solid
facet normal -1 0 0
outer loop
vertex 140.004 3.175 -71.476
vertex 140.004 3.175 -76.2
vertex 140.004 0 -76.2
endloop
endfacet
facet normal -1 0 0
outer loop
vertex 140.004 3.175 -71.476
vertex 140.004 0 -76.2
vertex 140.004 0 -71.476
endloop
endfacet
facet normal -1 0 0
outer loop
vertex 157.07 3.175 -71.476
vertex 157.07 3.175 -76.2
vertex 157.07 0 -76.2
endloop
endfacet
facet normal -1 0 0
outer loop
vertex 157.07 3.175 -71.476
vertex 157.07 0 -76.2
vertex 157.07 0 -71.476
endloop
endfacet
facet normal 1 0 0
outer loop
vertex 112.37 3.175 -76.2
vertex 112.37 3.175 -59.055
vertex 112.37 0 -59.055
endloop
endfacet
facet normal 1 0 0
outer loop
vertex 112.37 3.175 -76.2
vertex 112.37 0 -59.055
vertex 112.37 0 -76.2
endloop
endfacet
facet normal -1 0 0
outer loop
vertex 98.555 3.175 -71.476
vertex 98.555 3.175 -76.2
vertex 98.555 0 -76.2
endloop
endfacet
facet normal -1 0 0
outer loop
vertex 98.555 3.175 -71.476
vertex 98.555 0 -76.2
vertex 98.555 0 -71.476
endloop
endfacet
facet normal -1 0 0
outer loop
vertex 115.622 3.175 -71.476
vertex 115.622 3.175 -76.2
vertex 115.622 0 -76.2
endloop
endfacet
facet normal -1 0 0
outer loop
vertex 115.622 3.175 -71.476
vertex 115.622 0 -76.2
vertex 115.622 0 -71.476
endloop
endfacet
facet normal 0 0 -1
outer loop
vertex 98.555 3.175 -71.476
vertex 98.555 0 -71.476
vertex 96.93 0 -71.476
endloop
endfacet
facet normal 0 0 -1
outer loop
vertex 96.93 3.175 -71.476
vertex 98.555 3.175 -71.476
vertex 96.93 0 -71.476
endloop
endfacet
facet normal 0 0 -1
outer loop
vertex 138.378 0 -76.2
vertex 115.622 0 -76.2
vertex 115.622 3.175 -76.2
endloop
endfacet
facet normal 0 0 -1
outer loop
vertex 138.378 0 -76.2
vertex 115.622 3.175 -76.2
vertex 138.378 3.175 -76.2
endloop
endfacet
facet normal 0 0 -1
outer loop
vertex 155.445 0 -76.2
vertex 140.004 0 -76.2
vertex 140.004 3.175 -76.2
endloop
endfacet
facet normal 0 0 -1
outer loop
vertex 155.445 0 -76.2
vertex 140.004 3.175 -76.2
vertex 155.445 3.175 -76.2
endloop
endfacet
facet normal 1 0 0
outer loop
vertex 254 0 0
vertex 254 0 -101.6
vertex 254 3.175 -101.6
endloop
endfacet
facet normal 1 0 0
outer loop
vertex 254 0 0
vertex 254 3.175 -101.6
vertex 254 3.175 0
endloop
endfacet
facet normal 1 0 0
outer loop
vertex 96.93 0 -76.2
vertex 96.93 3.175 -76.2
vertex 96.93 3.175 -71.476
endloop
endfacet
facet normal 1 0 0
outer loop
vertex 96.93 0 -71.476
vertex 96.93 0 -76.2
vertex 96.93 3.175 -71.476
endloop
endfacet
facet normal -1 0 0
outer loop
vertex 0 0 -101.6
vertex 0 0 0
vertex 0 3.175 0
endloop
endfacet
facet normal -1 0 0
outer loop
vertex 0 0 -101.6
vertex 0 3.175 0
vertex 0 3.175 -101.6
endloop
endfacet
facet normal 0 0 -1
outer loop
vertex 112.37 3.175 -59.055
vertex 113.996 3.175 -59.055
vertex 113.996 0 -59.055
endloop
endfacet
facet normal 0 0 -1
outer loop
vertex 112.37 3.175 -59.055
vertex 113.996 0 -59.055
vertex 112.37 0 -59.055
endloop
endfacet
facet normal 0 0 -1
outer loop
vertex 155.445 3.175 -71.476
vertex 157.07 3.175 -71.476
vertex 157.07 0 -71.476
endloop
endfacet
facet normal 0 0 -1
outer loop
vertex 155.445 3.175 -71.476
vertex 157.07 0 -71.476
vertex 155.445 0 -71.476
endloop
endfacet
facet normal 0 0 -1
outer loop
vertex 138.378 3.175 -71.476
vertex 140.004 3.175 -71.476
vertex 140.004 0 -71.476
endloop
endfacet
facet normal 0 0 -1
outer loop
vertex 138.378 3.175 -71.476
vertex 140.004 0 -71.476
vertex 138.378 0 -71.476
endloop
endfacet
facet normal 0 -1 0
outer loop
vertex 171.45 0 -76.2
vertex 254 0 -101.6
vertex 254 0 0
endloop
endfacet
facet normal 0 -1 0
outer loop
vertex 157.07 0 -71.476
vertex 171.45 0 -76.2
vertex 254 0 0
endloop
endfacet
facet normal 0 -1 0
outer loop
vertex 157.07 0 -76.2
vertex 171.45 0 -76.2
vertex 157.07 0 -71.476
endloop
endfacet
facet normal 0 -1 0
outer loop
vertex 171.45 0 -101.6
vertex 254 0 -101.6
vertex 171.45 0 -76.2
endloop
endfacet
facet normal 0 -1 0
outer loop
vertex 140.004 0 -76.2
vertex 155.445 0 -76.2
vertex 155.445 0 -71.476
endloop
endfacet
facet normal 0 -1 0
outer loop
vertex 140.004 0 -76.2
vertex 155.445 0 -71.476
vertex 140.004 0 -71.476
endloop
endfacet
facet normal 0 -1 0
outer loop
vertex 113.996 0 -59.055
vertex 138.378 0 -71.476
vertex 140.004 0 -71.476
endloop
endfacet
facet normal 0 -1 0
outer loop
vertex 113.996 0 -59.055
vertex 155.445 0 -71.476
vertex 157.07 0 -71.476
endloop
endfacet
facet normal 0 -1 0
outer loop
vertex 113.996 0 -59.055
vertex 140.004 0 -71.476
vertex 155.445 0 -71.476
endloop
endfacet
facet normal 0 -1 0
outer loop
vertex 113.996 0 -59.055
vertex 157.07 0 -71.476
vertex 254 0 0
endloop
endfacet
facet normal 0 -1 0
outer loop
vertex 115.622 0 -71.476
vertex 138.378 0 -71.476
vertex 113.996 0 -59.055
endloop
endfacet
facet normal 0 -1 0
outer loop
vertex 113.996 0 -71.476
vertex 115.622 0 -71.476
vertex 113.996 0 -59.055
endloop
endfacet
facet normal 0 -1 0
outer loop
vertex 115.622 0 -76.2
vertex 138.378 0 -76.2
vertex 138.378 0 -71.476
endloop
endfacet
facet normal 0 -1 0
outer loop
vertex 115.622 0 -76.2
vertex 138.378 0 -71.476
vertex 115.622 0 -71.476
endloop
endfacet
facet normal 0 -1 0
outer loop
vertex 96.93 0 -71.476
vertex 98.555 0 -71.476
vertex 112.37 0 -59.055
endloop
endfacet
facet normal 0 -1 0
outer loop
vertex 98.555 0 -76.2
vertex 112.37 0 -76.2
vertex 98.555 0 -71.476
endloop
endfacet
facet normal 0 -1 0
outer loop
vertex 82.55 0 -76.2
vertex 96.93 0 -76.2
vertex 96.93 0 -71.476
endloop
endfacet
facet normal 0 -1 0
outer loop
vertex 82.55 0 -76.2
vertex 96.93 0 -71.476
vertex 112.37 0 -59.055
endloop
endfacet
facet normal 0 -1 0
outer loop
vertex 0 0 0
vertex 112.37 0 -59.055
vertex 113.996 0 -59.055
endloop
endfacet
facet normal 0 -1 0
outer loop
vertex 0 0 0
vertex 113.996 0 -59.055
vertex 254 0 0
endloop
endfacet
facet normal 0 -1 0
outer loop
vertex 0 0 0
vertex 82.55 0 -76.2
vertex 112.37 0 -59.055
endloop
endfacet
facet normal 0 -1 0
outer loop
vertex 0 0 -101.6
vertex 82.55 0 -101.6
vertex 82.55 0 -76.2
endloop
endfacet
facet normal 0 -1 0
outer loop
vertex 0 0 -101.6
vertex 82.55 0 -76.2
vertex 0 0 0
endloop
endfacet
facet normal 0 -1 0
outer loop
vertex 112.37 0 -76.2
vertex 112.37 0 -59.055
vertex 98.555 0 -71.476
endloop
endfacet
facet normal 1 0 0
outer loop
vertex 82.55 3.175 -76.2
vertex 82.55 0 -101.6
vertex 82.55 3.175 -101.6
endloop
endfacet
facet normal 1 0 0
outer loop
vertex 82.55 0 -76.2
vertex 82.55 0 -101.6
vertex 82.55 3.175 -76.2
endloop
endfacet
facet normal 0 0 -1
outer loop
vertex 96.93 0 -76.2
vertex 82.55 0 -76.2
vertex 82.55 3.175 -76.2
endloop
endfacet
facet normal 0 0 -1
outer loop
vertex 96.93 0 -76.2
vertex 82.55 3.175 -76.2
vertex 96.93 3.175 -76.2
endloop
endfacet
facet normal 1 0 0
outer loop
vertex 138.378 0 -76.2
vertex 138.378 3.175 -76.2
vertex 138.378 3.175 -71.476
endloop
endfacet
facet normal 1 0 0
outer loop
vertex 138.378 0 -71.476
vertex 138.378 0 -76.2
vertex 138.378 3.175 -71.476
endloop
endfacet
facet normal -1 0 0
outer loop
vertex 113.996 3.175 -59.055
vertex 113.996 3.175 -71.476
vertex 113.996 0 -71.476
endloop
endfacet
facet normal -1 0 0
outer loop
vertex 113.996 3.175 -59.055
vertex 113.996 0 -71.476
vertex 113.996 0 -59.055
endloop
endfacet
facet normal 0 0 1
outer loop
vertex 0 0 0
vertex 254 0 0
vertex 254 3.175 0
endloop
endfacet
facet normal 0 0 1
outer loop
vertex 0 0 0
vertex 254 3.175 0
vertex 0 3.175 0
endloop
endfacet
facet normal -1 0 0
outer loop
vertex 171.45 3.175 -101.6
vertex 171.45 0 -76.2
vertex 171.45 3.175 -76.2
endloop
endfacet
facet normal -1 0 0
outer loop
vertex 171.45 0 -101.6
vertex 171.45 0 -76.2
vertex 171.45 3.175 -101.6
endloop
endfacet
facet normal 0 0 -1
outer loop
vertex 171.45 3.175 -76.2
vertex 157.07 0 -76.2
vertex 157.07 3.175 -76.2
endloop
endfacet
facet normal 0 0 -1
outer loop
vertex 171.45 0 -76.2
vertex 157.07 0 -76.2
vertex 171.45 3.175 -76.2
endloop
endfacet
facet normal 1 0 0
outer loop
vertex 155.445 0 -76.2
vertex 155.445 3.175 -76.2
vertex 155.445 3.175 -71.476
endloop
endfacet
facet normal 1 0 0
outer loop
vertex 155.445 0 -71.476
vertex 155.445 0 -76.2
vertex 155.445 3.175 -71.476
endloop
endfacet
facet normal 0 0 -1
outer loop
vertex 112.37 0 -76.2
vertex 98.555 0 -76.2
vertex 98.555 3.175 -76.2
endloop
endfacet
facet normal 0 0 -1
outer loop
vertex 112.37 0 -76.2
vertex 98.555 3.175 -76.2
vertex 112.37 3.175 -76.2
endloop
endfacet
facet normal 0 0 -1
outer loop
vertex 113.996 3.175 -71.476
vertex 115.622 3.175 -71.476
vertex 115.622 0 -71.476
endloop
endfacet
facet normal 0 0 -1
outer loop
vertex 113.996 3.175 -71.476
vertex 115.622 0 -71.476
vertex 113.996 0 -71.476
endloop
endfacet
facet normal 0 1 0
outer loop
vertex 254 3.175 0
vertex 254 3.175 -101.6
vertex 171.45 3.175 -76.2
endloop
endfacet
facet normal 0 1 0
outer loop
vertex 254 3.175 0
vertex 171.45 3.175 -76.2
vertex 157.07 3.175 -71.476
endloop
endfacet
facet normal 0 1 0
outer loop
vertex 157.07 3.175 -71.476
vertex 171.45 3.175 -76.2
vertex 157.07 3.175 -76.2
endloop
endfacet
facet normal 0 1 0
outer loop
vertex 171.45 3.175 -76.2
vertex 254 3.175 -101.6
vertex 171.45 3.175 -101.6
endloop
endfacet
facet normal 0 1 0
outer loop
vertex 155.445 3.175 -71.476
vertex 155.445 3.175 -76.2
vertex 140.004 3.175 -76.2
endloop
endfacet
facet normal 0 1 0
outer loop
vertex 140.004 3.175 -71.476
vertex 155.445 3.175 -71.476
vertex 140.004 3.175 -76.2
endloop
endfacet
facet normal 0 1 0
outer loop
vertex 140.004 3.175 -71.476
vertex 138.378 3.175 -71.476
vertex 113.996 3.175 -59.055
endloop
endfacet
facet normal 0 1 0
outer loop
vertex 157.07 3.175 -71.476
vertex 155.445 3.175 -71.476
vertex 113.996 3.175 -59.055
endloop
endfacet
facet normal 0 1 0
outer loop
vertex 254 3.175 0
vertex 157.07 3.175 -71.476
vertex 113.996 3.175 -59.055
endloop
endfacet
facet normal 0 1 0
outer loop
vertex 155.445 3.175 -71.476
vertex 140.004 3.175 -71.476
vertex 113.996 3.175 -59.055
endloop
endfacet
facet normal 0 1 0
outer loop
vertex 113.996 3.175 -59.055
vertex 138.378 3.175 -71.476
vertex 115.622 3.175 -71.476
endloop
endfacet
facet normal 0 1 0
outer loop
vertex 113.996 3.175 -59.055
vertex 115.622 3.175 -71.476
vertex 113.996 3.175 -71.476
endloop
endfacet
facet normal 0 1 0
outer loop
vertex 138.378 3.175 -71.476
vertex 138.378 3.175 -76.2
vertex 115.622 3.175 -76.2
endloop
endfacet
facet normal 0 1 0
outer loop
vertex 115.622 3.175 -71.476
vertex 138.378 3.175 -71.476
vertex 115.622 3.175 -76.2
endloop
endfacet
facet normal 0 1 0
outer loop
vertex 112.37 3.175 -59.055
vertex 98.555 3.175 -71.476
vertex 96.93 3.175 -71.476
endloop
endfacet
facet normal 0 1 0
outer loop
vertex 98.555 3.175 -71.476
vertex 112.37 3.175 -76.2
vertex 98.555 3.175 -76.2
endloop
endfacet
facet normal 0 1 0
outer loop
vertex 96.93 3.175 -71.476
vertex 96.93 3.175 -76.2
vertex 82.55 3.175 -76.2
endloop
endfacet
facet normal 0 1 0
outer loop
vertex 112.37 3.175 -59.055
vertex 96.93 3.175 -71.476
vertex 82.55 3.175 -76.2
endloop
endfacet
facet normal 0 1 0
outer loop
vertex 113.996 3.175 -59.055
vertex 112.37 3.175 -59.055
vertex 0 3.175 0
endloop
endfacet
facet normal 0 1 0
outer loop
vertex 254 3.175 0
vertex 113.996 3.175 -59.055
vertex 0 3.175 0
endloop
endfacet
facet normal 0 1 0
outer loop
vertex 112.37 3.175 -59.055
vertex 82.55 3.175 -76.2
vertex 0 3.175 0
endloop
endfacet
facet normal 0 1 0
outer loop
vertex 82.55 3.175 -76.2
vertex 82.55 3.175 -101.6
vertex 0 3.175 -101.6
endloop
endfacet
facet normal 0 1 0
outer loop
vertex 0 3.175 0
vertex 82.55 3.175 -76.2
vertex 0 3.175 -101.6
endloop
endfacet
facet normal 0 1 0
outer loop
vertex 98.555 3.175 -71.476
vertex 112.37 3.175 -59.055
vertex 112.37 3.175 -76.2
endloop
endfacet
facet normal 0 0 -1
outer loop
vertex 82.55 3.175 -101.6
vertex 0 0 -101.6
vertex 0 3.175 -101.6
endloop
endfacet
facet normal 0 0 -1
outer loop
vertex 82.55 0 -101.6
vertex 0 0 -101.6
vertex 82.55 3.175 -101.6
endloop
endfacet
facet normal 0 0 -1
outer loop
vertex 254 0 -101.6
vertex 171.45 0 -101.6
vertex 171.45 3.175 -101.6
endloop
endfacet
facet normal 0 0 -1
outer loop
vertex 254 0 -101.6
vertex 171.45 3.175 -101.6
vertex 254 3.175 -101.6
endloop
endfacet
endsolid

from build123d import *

# Parameters (mm, degrees)
BOSS_EXTRUDE1_DEPTH = 3.175
CUT_EXTRUDE1_REACH  = 275.585
SKETCH2_W           = 1.6256
SKETCH2_H           = 4.7244


with BuildPart() as part:
    # Sketch1 → Boss-Extrude1 (new body)
    with BuildSketch(Plane(origin=(0, 0, 0), x_dir=(1, 0, 0), z_dir=(0, 1, 0))):
        Polygon((171.45, 101.6), (254, 101.6), (254, 0), (0, 0), (0, 101.6), (82.55, 101.6), (82.55, 76.2), (171.45, 76.2), align=None)
    extrude(amount=BOSS_EXTRUDE1_DEPTH)

    # Sketch2 → Cut-Extrude1 (cut, up to next)
    with BuildSketch(Plane(origin=(0, 3.175, 0), x_dir=(-1, 0, 0), z_dir=(0, 1, 0)), mode=Mode.PRIVATE) as cut_extrude1_sk1:
        with Locations((-97.742468943, -73.8378)):
            Rectangle(SKETCH2_W, SKETCH2_H)
    cut_extrude1_tool1 = extrude(cut_extrude1_sk1.sketch, amount=-CUT_EXTRUDE1_REACH, mode=Mode.PRIVATE) & part.part
    # Sketch2 → Cut-Extrude1 (cut, up to next)
    with BuildSketch(Plane(origin=(0, 3.175, 0), x_dir=(-1, 0, 0), z_dir=(0, 1, 0)), mode=Mode.PRIVATE) as cut_extrude1_sk2:
        Polygon((-113.996008389, -76.2), (-115.621608389, -76.2), (-115.621608389, -71.4756), (-113.996008389, -71.4756), (-113.996008389, -59.055), (-112.370408389, -59.055), (-112.370408389, -76.2), align=None)
    cut_extrude1_tool2 = extrude(cut_extrude1_sk2.sketch, amount=-CUT_EXTRUDE1_REACH, mode=Mode.PRIVATE) & part.part
    # Sketch2 → Cut-Extrude1 (cut, up to next)
    with BuildSketch(Plane(origin=(0, 3.175, 0), x_dir=(-1, 0, 0), z_dir=(0, 1, 0)), mode=Mode.PRIVATE) as cut_extrude1_sk3:
        with Locations((-139.191191611, -73.8378)):
            Rectangle(SKETCH2_W, SKETCH2_H)
    cut_extrude1_tool3 = extrude(cut_extrude1_sk3.sketch, amount=-CUT_EXTRUDE1_REACH, mode=Mode.PRIVATE) & part.part
    # Sketch2 → Cut-Extrude1 (cut, up to next)
    with BuildSketch(Plane(origin=(0, 3.175, 0), x_dir=(-1, 0, 0), z_dir=(0, 1, 0)), mode=Mode.PRIVATE) as cut_extrude1_sk4:
        with Locations((-156.257531057, -73.8378)):
            Rectangle(SKETCH2_W, SKETCH2_H)
    cut_extrude1_tool4 = extrude(cut_extrude1_sk4.sketch, amount=-CUT_EXTRUDE1_REACH, mode=Mode.PRIVATE) & part.part
    add(cut_extrude1_tool1.solids().sort_by_distance((97.742469, 3.175, -73.8378))[0], mode=Mode.SUBTRACT)
    add(cut_extrude1_tool2.solids().sort_by_distance((113.534383, 3.175, -68.969098))[0], mode=Mode.SUBTRACT)
    add(cut_extrude1_tool3.solids().sort_by_distance((139.191192, 3.175, -73.8378))[0], mode=Mode.SUBTRACT)
    add(cut_extrude1_tool4.solids().sort_by_distance((156.257531, 3.175, -73.8378))[0], mode=Mode.SUBTRACT)


solid = part.part
